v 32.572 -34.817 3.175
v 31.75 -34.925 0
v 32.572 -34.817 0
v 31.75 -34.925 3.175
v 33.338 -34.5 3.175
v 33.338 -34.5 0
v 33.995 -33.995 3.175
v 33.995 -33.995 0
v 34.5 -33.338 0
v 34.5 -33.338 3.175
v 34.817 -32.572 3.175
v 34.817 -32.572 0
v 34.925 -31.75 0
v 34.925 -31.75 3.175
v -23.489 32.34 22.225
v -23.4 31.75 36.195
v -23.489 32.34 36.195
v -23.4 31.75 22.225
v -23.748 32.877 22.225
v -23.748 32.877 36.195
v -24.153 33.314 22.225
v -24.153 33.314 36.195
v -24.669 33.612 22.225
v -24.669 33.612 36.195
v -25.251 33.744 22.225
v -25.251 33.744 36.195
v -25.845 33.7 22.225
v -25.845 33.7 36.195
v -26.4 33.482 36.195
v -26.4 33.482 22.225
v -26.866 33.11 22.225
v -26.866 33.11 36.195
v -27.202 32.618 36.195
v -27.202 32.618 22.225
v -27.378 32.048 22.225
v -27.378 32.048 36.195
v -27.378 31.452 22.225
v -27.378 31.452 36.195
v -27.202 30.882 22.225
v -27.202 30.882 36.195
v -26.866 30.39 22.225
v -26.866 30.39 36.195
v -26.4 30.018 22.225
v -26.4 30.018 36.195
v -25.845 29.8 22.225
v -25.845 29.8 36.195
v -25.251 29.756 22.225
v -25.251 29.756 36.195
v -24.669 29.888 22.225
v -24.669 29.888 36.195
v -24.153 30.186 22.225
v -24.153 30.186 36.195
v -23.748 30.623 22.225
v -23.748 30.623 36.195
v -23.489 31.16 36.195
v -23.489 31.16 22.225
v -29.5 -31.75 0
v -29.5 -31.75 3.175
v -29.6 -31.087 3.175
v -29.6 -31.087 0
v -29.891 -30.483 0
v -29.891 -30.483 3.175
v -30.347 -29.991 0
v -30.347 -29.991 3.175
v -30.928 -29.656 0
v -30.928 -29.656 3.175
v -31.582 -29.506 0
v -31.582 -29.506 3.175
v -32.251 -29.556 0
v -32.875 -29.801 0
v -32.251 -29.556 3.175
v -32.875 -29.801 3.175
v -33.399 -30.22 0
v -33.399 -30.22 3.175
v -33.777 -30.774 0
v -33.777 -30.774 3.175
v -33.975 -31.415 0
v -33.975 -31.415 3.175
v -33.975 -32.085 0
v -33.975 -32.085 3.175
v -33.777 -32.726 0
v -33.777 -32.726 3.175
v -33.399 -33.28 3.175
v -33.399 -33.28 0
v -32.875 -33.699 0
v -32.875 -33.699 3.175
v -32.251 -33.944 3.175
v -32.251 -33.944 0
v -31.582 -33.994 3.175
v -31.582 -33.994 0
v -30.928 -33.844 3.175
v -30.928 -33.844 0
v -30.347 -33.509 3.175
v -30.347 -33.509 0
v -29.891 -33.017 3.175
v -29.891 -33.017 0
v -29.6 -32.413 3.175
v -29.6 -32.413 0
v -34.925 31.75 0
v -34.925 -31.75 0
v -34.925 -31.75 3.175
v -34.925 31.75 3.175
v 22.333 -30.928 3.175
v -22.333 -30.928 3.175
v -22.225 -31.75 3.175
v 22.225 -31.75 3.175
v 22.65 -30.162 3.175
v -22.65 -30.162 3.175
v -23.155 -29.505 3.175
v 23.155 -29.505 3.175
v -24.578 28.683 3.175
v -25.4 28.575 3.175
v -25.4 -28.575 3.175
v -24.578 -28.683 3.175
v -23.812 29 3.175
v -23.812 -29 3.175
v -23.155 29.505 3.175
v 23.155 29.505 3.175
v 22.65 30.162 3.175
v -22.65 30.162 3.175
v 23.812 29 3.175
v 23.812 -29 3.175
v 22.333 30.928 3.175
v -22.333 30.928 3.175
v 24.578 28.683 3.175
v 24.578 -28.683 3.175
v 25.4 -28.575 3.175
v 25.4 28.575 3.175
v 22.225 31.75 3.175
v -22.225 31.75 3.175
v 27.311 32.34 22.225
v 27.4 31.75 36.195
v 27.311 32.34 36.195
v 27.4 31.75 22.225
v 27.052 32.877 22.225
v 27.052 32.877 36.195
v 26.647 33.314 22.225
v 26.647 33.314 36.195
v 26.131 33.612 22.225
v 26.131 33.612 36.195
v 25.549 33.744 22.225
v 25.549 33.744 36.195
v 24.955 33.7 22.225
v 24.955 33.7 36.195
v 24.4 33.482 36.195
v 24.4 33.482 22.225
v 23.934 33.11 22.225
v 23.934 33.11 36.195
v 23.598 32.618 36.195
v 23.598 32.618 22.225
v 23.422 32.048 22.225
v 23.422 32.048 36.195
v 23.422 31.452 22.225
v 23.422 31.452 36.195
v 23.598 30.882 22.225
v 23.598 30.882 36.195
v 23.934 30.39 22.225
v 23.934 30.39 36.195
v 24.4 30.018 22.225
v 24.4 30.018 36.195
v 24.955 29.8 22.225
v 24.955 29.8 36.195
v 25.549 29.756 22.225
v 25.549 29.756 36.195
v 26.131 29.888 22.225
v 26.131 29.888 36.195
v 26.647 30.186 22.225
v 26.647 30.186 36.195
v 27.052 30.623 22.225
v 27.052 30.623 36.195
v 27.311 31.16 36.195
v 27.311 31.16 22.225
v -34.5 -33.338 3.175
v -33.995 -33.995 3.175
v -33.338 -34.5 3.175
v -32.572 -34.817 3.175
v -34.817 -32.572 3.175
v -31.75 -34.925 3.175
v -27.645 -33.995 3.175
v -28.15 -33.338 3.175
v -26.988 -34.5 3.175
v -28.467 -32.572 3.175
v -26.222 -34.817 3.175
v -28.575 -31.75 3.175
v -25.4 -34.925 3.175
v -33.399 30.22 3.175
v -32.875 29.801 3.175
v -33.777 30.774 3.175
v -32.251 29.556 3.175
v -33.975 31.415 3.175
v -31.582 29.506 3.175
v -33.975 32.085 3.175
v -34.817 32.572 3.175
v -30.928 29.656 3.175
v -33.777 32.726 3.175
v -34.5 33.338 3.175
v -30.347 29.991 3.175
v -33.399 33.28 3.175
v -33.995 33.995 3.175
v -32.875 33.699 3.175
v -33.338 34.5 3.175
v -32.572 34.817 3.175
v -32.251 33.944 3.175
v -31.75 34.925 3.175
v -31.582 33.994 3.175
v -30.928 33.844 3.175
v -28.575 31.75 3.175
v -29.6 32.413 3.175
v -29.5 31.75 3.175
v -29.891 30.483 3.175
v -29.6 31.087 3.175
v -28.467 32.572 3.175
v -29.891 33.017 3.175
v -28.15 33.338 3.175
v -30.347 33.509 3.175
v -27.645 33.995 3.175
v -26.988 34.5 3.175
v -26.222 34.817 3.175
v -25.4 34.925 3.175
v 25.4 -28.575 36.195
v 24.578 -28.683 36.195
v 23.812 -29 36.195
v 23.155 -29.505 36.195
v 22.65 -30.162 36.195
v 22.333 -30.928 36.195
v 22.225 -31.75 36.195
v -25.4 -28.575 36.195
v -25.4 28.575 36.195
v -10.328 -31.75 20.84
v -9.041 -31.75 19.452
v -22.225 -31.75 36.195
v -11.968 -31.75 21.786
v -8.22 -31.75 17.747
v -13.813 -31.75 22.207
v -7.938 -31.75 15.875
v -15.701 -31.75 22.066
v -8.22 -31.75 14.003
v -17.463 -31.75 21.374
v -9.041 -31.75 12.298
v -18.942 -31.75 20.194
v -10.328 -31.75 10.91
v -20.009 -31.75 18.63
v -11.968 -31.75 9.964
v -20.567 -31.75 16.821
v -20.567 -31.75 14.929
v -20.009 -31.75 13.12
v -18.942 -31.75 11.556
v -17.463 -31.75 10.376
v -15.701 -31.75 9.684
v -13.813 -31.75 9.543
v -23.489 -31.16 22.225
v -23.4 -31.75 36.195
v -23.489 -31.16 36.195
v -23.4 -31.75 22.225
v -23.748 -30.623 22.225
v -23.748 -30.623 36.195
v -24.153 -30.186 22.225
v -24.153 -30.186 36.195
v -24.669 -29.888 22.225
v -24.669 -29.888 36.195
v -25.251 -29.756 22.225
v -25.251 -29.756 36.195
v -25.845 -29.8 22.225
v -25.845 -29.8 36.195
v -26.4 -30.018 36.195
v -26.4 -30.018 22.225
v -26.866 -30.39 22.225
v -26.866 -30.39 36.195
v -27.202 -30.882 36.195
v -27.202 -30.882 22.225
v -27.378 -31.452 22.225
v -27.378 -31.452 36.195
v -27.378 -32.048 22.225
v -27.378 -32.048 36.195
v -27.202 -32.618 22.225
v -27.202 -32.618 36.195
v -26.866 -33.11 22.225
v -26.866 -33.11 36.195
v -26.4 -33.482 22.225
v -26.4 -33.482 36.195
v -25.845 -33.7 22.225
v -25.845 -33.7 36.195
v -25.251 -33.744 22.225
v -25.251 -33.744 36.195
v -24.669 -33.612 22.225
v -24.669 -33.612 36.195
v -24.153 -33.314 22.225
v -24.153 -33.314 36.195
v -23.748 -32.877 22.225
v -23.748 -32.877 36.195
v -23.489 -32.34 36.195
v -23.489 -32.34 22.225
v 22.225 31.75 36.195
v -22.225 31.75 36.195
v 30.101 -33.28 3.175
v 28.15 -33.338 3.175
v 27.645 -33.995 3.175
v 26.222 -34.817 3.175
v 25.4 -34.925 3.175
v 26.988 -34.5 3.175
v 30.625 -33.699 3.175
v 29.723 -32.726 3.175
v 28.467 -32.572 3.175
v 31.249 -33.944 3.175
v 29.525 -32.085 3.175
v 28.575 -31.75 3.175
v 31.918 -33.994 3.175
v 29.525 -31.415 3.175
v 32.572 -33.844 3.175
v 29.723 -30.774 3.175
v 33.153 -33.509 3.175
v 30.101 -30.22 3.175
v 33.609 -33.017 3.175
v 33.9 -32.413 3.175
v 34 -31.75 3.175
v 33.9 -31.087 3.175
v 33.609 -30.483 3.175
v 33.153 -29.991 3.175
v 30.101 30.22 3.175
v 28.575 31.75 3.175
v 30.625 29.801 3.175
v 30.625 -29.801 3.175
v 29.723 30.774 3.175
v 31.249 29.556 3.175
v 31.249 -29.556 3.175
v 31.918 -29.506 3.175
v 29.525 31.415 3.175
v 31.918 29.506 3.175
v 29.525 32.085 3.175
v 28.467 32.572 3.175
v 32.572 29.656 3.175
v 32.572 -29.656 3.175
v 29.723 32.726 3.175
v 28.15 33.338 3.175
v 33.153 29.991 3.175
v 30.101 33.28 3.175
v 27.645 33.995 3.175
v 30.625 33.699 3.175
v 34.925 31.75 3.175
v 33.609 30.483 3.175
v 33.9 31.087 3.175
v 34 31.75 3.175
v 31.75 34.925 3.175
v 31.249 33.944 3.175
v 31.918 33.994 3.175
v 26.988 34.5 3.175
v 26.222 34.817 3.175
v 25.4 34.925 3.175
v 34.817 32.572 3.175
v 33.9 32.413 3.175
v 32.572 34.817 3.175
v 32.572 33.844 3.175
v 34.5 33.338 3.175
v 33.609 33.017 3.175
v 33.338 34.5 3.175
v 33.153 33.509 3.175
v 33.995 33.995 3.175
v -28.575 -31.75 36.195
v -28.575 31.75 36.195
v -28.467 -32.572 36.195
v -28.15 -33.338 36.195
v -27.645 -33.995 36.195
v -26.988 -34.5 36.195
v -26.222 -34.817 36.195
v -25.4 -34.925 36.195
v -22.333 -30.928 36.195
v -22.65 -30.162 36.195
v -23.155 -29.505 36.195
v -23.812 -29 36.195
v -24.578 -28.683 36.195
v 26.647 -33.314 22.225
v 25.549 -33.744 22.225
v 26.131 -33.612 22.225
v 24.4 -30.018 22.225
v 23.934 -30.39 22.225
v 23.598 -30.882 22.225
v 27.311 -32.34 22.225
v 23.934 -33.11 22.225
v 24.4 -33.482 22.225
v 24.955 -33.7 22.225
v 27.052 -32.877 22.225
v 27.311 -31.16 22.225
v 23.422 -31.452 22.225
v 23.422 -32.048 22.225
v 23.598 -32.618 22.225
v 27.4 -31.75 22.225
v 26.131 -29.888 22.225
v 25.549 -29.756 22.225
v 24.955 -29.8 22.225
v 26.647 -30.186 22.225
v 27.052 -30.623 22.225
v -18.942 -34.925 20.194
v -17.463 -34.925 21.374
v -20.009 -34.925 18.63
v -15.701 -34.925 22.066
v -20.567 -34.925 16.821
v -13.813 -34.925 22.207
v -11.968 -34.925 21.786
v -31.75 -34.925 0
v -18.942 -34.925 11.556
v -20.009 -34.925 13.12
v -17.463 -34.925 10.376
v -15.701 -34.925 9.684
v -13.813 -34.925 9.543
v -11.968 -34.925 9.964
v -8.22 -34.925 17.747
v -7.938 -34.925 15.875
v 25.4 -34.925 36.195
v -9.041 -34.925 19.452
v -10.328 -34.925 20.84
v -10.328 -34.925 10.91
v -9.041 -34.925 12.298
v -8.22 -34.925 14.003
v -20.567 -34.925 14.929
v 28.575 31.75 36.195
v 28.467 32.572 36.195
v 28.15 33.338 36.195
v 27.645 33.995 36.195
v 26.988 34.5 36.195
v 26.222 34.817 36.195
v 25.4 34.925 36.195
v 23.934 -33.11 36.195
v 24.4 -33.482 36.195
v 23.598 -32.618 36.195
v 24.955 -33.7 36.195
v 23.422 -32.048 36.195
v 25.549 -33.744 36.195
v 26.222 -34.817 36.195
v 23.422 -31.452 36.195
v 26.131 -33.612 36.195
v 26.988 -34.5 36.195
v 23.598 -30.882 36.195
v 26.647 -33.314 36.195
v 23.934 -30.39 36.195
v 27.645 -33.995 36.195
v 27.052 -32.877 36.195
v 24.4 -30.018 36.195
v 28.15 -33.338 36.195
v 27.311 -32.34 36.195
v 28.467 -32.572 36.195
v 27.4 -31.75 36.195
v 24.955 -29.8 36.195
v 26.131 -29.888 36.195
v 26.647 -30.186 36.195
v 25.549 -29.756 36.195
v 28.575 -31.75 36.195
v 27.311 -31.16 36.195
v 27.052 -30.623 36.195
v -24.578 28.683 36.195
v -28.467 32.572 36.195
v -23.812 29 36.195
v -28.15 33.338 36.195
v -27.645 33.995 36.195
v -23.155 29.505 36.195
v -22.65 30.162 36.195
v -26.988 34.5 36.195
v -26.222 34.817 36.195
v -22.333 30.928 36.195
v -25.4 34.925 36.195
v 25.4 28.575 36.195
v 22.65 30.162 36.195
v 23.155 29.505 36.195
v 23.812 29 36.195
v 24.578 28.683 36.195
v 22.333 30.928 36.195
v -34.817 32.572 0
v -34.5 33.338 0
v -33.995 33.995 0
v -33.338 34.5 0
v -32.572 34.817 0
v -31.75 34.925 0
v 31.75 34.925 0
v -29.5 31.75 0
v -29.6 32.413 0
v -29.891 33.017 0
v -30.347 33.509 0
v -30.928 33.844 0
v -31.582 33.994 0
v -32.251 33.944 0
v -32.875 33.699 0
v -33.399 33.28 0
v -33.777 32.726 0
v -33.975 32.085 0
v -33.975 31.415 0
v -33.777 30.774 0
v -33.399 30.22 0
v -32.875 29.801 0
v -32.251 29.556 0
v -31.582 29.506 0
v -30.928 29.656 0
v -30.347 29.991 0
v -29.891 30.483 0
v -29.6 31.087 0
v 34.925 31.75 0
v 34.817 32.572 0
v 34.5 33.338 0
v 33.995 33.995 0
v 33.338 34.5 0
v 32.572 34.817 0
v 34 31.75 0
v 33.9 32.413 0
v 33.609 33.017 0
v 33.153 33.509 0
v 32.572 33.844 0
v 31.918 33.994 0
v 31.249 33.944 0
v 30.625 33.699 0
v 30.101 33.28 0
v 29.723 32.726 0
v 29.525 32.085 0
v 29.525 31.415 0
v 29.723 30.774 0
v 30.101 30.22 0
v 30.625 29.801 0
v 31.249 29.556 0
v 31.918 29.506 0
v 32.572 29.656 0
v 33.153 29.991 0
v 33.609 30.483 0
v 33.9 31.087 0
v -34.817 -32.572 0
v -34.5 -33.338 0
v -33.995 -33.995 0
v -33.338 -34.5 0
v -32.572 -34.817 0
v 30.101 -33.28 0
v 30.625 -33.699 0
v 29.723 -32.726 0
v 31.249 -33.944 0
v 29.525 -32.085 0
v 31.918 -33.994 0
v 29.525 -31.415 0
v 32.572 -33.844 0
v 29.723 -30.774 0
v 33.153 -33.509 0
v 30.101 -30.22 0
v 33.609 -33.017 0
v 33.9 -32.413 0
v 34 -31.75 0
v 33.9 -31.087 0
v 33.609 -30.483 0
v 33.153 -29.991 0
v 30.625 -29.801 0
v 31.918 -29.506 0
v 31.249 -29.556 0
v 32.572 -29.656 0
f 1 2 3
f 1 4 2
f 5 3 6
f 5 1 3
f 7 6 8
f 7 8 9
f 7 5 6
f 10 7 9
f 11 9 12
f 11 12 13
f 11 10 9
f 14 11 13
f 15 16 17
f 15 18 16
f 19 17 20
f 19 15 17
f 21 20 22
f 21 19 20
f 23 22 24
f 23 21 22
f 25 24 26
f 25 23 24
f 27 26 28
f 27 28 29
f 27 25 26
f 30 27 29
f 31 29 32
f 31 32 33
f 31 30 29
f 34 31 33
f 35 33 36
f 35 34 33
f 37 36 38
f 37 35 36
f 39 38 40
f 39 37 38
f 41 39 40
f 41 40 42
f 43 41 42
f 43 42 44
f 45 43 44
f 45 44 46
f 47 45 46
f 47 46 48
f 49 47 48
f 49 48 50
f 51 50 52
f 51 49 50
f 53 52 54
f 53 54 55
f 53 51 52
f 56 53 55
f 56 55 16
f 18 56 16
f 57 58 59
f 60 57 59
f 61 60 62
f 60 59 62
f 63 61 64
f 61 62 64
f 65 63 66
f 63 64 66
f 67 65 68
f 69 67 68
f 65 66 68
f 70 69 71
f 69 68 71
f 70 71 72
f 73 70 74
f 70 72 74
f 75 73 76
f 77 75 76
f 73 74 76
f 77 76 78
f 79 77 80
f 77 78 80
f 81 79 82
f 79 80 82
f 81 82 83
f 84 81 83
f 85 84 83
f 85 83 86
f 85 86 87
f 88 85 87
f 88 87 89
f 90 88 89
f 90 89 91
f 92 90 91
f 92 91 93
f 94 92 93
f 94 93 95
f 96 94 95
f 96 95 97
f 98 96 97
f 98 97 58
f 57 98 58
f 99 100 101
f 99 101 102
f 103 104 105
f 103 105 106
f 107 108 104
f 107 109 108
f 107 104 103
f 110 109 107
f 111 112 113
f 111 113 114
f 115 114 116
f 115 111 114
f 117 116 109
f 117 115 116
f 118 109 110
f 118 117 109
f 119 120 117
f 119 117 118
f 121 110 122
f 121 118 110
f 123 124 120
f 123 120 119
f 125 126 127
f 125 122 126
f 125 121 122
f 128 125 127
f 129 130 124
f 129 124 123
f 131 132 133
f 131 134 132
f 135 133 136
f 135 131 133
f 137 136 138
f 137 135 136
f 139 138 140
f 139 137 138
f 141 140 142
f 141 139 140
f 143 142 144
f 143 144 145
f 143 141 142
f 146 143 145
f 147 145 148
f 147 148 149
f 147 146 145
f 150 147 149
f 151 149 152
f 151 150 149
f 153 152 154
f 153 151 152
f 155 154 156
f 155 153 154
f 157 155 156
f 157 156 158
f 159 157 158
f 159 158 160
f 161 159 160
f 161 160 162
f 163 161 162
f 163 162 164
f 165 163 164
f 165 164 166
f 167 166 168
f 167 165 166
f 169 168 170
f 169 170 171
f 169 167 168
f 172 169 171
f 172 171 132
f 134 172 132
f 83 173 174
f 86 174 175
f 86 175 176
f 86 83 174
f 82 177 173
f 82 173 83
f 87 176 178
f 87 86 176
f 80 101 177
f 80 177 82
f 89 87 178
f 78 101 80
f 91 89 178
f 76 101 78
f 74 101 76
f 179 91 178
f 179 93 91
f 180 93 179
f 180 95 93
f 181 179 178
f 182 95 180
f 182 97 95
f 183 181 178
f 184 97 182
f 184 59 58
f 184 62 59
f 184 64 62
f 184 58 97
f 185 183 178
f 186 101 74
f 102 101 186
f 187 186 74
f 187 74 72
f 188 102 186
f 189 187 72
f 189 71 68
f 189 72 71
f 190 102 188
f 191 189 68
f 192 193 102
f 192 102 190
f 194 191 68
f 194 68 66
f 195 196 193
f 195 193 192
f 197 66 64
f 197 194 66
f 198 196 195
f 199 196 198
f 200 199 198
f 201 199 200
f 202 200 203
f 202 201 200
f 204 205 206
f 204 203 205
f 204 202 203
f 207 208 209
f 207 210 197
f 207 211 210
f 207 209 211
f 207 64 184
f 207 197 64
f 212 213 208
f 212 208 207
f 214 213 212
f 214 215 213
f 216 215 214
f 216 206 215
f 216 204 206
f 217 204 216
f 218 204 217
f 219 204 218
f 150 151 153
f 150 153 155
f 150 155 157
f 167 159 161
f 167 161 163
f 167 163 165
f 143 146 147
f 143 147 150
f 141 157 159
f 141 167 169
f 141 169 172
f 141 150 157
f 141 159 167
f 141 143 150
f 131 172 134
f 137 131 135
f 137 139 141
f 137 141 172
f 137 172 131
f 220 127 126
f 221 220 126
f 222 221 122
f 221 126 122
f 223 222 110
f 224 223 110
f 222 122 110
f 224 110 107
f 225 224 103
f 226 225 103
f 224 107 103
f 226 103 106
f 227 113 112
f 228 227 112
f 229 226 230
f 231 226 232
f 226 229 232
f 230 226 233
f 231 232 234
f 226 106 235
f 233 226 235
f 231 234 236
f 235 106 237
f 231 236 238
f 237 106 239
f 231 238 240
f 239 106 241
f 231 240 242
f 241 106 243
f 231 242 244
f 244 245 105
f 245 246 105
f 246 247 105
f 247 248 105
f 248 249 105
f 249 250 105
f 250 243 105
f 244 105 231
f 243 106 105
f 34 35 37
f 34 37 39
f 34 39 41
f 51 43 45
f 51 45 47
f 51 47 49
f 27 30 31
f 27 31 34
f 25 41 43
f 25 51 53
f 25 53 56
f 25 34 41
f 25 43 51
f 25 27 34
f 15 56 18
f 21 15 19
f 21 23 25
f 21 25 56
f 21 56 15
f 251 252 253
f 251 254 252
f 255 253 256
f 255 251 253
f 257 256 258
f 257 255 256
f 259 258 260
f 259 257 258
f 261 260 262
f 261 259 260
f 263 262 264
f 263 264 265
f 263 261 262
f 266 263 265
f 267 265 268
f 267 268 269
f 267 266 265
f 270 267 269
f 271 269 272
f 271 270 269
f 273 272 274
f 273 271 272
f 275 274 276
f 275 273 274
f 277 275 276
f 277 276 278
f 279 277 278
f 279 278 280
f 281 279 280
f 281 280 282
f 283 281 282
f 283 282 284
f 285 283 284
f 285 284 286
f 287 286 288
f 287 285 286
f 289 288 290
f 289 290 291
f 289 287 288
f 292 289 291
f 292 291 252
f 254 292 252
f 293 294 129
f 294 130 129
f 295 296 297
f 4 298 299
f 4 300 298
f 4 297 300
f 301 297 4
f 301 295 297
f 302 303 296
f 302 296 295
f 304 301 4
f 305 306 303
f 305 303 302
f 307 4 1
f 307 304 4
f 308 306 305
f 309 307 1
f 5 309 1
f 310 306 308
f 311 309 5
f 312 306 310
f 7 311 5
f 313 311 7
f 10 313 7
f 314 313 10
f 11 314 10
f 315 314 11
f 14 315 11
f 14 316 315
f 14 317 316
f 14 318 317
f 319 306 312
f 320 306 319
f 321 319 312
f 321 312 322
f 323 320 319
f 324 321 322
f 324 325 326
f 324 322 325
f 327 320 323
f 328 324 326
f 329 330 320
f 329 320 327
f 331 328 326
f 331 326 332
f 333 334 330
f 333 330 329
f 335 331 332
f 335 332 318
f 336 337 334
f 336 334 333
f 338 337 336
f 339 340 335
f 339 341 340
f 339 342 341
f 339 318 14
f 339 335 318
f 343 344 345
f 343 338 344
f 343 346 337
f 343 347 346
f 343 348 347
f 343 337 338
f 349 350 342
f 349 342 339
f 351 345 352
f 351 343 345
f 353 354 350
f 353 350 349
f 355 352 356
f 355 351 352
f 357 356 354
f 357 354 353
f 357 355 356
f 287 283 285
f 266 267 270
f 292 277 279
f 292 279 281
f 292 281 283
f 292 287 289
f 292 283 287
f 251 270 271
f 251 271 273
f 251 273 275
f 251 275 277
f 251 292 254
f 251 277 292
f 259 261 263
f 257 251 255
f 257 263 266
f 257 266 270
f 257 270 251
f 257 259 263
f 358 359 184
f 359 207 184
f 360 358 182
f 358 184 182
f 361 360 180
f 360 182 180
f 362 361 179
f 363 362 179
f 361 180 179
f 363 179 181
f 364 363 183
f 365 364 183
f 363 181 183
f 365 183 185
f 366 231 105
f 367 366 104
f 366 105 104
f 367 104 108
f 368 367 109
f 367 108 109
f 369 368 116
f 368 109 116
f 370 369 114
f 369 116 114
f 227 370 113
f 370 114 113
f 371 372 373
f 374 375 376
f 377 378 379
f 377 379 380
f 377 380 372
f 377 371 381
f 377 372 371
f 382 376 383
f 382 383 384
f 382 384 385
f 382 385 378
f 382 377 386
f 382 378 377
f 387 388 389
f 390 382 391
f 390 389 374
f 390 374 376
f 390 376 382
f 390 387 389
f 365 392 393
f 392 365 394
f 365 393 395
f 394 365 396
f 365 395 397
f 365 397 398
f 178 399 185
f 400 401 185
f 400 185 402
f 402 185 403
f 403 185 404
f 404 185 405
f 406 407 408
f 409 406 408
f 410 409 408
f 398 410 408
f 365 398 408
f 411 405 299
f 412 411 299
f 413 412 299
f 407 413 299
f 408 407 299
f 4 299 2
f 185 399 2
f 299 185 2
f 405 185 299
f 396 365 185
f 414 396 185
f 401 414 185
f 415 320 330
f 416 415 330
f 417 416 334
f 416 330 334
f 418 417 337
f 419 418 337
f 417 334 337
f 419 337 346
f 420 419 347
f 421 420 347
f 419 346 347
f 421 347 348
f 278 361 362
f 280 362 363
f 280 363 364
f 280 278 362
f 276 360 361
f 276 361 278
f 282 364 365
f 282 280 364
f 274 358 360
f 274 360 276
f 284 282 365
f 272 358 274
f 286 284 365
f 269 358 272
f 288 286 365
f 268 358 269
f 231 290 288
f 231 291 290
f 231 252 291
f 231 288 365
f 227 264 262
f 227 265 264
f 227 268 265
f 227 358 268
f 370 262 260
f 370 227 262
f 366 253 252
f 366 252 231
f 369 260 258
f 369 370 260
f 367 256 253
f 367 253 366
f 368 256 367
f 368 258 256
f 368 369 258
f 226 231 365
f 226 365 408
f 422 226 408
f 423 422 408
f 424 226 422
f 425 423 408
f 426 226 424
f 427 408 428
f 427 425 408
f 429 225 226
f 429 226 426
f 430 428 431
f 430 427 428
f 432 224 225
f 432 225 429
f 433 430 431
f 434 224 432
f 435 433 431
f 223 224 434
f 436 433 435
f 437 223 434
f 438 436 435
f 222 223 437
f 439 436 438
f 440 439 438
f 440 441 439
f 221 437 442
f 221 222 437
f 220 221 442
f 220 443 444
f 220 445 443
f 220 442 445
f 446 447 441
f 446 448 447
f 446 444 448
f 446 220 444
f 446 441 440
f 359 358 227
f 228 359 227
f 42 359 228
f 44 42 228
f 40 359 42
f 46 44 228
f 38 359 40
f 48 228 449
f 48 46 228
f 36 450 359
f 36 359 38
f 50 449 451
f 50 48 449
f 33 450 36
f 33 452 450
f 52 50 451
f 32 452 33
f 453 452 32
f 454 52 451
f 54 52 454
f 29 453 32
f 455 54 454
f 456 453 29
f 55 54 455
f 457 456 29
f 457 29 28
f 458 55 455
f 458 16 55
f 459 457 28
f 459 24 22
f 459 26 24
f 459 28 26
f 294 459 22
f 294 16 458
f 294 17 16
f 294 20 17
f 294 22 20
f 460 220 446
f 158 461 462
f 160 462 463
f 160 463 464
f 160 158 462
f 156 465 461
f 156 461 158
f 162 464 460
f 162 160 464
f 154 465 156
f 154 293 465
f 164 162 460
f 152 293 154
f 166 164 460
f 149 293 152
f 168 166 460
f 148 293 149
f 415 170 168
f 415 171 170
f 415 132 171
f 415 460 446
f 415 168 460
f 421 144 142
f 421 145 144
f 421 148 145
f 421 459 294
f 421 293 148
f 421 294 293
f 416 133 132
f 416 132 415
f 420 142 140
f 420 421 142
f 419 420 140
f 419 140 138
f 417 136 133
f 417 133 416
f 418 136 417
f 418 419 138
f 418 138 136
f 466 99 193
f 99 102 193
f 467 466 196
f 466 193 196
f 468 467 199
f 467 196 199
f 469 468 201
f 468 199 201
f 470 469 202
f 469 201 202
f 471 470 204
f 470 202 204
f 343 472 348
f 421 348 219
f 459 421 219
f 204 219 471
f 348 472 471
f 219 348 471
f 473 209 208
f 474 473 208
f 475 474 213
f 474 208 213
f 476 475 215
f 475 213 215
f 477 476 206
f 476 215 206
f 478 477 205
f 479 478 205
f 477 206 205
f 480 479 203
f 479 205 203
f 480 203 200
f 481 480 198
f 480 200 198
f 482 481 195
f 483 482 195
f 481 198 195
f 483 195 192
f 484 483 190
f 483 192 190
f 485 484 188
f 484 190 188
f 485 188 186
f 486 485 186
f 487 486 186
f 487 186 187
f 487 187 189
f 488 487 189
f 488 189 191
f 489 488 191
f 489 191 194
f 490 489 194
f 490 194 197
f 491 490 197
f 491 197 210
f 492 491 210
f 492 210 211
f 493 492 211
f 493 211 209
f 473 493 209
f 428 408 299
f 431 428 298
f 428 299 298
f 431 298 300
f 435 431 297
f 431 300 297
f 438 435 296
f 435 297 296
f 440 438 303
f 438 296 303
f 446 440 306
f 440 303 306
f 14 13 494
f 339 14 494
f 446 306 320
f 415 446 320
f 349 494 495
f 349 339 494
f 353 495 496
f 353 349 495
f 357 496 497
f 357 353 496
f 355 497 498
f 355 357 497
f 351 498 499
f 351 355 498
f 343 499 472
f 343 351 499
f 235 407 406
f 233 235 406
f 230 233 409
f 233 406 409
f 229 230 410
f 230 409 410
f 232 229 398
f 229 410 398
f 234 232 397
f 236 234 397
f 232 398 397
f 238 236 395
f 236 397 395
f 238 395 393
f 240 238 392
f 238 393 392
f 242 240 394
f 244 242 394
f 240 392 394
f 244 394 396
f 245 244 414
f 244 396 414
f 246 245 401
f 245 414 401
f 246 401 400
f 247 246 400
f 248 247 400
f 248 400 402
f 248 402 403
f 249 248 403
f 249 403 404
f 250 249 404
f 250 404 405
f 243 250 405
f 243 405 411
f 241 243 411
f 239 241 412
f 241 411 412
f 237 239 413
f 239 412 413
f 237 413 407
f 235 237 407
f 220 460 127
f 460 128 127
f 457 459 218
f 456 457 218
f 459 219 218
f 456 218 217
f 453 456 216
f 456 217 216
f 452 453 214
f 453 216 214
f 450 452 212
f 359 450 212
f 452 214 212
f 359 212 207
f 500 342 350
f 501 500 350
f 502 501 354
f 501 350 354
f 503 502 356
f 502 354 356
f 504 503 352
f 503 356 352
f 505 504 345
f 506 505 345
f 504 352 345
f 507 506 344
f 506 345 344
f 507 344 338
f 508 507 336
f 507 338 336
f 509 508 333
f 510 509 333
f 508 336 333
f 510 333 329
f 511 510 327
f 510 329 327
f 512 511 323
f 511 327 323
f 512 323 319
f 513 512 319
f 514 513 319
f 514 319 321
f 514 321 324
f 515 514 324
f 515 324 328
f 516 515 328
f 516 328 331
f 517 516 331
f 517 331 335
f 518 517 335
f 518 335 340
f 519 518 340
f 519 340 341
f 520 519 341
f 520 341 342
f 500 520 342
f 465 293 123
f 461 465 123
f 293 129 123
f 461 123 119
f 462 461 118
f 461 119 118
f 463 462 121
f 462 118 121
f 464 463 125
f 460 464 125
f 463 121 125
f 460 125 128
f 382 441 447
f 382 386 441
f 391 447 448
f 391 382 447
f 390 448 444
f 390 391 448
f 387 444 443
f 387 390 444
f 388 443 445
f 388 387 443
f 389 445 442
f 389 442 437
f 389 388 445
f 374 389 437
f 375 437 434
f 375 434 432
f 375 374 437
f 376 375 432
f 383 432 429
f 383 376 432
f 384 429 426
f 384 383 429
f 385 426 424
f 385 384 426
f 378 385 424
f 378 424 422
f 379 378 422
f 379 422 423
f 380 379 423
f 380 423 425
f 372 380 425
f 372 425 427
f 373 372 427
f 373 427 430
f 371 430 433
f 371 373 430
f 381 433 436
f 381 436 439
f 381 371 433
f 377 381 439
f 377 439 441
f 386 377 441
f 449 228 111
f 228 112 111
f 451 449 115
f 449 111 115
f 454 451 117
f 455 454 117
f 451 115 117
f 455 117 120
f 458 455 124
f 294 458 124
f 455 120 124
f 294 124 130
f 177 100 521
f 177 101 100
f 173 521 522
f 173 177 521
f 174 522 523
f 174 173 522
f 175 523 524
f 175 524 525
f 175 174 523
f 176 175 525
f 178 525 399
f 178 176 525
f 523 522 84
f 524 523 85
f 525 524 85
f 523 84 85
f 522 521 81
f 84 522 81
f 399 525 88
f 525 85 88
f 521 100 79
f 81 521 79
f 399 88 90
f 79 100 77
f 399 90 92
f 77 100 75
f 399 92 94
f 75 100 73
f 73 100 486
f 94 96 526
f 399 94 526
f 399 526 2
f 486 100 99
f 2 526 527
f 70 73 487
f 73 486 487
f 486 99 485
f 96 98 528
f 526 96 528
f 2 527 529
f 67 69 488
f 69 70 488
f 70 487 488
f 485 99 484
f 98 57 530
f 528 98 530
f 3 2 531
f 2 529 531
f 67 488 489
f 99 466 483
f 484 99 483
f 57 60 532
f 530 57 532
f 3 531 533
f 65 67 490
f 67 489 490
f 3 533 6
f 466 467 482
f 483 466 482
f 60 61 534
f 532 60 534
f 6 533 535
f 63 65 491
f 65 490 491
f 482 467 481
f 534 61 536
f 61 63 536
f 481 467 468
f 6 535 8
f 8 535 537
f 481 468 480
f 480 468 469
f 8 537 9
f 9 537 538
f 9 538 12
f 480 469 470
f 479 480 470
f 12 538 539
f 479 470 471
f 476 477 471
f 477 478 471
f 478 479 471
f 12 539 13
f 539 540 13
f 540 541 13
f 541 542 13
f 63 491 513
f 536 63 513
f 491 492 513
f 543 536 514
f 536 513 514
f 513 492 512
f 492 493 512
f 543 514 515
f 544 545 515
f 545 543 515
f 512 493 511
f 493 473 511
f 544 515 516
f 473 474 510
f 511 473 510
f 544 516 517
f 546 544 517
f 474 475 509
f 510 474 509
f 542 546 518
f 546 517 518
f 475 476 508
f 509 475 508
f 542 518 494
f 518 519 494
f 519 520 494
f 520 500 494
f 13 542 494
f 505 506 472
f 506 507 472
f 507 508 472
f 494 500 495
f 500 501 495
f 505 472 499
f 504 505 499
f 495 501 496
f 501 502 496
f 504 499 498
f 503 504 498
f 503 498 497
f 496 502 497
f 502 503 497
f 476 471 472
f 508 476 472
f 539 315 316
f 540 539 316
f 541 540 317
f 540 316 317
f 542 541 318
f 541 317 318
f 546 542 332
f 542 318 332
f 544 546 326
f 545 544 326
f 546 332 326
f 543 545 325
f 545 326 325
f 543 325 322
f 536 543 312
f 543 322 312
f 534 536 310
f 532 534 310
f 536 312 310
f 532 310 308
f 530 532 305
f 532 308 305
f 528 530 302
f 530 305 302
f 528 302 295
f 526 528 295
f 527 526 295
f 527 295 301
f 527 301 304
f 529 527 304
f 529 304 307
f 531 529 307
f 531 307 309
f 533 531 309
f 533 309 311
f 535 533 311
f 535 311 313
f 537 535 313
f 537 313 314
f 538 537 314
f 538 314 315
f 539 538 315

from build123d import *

# Parameters (mm, degrees)
F0_W          = 69.85
F0_H          = 69.85
F1_DEPTH      = 3.175
F2_R          = 3.175
F3_R          = 2.2499955
F4_DEPTH      = 25.4
F4_DEPTH_BACK = 101
F6_DEPTH      = 25.4
F7_R          = 1.999996
F8_DEPTH      = 6.35
F9_R          = 6.35
F10_DEPTH     = 3.175
F11_DEPTH     = 7.62


# Not quite as in the source:
# - an extrude ends at something that could not be found from the text; its depth is read off the source's solid


with BuildPart() as f1:
    # F0 (on Top) → F1 (new body)
    with BuildSketch(Plane.XY):
        Rectangle(F0_W, F0_H)
    extrude(amount=F1_DEPTH)

    # F2
    f2_edges = [f1.edges().sort_by_distance(p)[0] for p in [
        (-34.925, -34.925, 1.5875),
        (34.925, -34.925, 1.5875),
        (34.925, 34.925, 1.5875),
        (-34.925, 34.925, 1.5875),
    ]]
    fillet(f2_edges, radius=F2_R)

    # F3 (on face) → F4 (cut, two sides)
    with BuildSketch(Plane.XY.offset(3.175)) as f4_sk:
        with Locations((-31.75, 31.75)):
            Circle(F3_R)
        with Locations((31.75, 31.75)):
            Circle(F3_R)
        with Locations((31.75, -31.75)):
            Circle(F3_R)
        with Locations((-31.75, -31.75)):
            Circle(F3_R)
    extrude(amount=-F4_DEPTH, mode=Mode.SUBTRACT)
    extrude(f4_sk.sketch, amount=F4_DEPTH_BACK, mode=Mode.SUBTRACT)

    # F5 (on face) → F6 (join)
    with BuildSketch(Plane.XY.offset(3.175)):
        with BuildLine():
            Line((25.4, 34.925), (-25.4, 34.925))
            ThreePointArc((-25.4, 34.925), (-27.6450640303, 33.9950640303), (-28.575, 31.75))
            Line((-28.575, 31.75), (-28.575, -31.75))
            ThreePointArc((-28.575, -31.75), (-27.6450640303, -33.9950640303), (-25.4, -34.925))
            Line((-25.4, -34.925), (25.4, -34.925))
            ThreePointArc((25.4, -34.925), (27.6450640303, -33.9950640303), (28.575, -31.75))
            Line((28.575, -31.75), (28.575, 31.75))
            ThreePointArc((28.575, 31.75), (27.6450640303, 33.9950640303), (25.4, 34.925))
        make_face()
        with BuildLine():
            ThreePointArc((-25.4, 28.575), (-23.1549359697, 29.5049359697), (-22.225, 31.75))
            Line((-22.225, 31.75), (22.225, 31.75))
            ThreePointArc((22.225, 31.75), (23.1549359697, 29.5049359697), (25.4, 28.575))
            Line((25.4, 28.575), (25.4, -28.575))
            ThreePointArc((25.4, -28.575), (23.1549359697, -29.5049359697), (22.225, -31.75))
            Line((22.225, -31.75), (-22.225, -31.75))
            ThreePointArc((-22.225, -31.75), (-23.1549359697, -29.5049359697), (-25.4, -28.575))
            Line((-25.4, -28.575), (-25.4, 28.575))
        make_face(mode=Mode.SUBTRACT)
    extrude(amount=F6_DEPTH)

    # F7 (on face) → F8 (cut)
    with BuildSketch(Plane.XY.offset(28.575)):
        with Locations((-25.4, 31.75)):
            Circle(F7_R)
        with Locations((25.4, 31.75)):
            Circle(F7_R)
        with Locations((25.4, -31.75)):
            Circle(F7_R)
        with Locations((-25.4, -31.75)):
            Circle(F7_R)
    extrude(amount=-F8_DEPTH, mode=Mode.SUBTRACT)

    # F9 (on face) → F10 (cut, through all)
    with BuildSketch(Plane.XZ.offset(34.925)):
        with Locations((-14.2875, 15.875)):
            Circle(F9_R)
    extrude(amount=-F10_DEPTH, mode=Mode.SUBTRACT)

    # F11 (add): a face of the model
    f11_faces = [f1.faces().sort_by_distance(p)[0] for p in [
        (0, 34.0224954294, 28.575),
    ]]
    extrude(f11_faces, amount=F11_DEPTH)


solid = f1.part
